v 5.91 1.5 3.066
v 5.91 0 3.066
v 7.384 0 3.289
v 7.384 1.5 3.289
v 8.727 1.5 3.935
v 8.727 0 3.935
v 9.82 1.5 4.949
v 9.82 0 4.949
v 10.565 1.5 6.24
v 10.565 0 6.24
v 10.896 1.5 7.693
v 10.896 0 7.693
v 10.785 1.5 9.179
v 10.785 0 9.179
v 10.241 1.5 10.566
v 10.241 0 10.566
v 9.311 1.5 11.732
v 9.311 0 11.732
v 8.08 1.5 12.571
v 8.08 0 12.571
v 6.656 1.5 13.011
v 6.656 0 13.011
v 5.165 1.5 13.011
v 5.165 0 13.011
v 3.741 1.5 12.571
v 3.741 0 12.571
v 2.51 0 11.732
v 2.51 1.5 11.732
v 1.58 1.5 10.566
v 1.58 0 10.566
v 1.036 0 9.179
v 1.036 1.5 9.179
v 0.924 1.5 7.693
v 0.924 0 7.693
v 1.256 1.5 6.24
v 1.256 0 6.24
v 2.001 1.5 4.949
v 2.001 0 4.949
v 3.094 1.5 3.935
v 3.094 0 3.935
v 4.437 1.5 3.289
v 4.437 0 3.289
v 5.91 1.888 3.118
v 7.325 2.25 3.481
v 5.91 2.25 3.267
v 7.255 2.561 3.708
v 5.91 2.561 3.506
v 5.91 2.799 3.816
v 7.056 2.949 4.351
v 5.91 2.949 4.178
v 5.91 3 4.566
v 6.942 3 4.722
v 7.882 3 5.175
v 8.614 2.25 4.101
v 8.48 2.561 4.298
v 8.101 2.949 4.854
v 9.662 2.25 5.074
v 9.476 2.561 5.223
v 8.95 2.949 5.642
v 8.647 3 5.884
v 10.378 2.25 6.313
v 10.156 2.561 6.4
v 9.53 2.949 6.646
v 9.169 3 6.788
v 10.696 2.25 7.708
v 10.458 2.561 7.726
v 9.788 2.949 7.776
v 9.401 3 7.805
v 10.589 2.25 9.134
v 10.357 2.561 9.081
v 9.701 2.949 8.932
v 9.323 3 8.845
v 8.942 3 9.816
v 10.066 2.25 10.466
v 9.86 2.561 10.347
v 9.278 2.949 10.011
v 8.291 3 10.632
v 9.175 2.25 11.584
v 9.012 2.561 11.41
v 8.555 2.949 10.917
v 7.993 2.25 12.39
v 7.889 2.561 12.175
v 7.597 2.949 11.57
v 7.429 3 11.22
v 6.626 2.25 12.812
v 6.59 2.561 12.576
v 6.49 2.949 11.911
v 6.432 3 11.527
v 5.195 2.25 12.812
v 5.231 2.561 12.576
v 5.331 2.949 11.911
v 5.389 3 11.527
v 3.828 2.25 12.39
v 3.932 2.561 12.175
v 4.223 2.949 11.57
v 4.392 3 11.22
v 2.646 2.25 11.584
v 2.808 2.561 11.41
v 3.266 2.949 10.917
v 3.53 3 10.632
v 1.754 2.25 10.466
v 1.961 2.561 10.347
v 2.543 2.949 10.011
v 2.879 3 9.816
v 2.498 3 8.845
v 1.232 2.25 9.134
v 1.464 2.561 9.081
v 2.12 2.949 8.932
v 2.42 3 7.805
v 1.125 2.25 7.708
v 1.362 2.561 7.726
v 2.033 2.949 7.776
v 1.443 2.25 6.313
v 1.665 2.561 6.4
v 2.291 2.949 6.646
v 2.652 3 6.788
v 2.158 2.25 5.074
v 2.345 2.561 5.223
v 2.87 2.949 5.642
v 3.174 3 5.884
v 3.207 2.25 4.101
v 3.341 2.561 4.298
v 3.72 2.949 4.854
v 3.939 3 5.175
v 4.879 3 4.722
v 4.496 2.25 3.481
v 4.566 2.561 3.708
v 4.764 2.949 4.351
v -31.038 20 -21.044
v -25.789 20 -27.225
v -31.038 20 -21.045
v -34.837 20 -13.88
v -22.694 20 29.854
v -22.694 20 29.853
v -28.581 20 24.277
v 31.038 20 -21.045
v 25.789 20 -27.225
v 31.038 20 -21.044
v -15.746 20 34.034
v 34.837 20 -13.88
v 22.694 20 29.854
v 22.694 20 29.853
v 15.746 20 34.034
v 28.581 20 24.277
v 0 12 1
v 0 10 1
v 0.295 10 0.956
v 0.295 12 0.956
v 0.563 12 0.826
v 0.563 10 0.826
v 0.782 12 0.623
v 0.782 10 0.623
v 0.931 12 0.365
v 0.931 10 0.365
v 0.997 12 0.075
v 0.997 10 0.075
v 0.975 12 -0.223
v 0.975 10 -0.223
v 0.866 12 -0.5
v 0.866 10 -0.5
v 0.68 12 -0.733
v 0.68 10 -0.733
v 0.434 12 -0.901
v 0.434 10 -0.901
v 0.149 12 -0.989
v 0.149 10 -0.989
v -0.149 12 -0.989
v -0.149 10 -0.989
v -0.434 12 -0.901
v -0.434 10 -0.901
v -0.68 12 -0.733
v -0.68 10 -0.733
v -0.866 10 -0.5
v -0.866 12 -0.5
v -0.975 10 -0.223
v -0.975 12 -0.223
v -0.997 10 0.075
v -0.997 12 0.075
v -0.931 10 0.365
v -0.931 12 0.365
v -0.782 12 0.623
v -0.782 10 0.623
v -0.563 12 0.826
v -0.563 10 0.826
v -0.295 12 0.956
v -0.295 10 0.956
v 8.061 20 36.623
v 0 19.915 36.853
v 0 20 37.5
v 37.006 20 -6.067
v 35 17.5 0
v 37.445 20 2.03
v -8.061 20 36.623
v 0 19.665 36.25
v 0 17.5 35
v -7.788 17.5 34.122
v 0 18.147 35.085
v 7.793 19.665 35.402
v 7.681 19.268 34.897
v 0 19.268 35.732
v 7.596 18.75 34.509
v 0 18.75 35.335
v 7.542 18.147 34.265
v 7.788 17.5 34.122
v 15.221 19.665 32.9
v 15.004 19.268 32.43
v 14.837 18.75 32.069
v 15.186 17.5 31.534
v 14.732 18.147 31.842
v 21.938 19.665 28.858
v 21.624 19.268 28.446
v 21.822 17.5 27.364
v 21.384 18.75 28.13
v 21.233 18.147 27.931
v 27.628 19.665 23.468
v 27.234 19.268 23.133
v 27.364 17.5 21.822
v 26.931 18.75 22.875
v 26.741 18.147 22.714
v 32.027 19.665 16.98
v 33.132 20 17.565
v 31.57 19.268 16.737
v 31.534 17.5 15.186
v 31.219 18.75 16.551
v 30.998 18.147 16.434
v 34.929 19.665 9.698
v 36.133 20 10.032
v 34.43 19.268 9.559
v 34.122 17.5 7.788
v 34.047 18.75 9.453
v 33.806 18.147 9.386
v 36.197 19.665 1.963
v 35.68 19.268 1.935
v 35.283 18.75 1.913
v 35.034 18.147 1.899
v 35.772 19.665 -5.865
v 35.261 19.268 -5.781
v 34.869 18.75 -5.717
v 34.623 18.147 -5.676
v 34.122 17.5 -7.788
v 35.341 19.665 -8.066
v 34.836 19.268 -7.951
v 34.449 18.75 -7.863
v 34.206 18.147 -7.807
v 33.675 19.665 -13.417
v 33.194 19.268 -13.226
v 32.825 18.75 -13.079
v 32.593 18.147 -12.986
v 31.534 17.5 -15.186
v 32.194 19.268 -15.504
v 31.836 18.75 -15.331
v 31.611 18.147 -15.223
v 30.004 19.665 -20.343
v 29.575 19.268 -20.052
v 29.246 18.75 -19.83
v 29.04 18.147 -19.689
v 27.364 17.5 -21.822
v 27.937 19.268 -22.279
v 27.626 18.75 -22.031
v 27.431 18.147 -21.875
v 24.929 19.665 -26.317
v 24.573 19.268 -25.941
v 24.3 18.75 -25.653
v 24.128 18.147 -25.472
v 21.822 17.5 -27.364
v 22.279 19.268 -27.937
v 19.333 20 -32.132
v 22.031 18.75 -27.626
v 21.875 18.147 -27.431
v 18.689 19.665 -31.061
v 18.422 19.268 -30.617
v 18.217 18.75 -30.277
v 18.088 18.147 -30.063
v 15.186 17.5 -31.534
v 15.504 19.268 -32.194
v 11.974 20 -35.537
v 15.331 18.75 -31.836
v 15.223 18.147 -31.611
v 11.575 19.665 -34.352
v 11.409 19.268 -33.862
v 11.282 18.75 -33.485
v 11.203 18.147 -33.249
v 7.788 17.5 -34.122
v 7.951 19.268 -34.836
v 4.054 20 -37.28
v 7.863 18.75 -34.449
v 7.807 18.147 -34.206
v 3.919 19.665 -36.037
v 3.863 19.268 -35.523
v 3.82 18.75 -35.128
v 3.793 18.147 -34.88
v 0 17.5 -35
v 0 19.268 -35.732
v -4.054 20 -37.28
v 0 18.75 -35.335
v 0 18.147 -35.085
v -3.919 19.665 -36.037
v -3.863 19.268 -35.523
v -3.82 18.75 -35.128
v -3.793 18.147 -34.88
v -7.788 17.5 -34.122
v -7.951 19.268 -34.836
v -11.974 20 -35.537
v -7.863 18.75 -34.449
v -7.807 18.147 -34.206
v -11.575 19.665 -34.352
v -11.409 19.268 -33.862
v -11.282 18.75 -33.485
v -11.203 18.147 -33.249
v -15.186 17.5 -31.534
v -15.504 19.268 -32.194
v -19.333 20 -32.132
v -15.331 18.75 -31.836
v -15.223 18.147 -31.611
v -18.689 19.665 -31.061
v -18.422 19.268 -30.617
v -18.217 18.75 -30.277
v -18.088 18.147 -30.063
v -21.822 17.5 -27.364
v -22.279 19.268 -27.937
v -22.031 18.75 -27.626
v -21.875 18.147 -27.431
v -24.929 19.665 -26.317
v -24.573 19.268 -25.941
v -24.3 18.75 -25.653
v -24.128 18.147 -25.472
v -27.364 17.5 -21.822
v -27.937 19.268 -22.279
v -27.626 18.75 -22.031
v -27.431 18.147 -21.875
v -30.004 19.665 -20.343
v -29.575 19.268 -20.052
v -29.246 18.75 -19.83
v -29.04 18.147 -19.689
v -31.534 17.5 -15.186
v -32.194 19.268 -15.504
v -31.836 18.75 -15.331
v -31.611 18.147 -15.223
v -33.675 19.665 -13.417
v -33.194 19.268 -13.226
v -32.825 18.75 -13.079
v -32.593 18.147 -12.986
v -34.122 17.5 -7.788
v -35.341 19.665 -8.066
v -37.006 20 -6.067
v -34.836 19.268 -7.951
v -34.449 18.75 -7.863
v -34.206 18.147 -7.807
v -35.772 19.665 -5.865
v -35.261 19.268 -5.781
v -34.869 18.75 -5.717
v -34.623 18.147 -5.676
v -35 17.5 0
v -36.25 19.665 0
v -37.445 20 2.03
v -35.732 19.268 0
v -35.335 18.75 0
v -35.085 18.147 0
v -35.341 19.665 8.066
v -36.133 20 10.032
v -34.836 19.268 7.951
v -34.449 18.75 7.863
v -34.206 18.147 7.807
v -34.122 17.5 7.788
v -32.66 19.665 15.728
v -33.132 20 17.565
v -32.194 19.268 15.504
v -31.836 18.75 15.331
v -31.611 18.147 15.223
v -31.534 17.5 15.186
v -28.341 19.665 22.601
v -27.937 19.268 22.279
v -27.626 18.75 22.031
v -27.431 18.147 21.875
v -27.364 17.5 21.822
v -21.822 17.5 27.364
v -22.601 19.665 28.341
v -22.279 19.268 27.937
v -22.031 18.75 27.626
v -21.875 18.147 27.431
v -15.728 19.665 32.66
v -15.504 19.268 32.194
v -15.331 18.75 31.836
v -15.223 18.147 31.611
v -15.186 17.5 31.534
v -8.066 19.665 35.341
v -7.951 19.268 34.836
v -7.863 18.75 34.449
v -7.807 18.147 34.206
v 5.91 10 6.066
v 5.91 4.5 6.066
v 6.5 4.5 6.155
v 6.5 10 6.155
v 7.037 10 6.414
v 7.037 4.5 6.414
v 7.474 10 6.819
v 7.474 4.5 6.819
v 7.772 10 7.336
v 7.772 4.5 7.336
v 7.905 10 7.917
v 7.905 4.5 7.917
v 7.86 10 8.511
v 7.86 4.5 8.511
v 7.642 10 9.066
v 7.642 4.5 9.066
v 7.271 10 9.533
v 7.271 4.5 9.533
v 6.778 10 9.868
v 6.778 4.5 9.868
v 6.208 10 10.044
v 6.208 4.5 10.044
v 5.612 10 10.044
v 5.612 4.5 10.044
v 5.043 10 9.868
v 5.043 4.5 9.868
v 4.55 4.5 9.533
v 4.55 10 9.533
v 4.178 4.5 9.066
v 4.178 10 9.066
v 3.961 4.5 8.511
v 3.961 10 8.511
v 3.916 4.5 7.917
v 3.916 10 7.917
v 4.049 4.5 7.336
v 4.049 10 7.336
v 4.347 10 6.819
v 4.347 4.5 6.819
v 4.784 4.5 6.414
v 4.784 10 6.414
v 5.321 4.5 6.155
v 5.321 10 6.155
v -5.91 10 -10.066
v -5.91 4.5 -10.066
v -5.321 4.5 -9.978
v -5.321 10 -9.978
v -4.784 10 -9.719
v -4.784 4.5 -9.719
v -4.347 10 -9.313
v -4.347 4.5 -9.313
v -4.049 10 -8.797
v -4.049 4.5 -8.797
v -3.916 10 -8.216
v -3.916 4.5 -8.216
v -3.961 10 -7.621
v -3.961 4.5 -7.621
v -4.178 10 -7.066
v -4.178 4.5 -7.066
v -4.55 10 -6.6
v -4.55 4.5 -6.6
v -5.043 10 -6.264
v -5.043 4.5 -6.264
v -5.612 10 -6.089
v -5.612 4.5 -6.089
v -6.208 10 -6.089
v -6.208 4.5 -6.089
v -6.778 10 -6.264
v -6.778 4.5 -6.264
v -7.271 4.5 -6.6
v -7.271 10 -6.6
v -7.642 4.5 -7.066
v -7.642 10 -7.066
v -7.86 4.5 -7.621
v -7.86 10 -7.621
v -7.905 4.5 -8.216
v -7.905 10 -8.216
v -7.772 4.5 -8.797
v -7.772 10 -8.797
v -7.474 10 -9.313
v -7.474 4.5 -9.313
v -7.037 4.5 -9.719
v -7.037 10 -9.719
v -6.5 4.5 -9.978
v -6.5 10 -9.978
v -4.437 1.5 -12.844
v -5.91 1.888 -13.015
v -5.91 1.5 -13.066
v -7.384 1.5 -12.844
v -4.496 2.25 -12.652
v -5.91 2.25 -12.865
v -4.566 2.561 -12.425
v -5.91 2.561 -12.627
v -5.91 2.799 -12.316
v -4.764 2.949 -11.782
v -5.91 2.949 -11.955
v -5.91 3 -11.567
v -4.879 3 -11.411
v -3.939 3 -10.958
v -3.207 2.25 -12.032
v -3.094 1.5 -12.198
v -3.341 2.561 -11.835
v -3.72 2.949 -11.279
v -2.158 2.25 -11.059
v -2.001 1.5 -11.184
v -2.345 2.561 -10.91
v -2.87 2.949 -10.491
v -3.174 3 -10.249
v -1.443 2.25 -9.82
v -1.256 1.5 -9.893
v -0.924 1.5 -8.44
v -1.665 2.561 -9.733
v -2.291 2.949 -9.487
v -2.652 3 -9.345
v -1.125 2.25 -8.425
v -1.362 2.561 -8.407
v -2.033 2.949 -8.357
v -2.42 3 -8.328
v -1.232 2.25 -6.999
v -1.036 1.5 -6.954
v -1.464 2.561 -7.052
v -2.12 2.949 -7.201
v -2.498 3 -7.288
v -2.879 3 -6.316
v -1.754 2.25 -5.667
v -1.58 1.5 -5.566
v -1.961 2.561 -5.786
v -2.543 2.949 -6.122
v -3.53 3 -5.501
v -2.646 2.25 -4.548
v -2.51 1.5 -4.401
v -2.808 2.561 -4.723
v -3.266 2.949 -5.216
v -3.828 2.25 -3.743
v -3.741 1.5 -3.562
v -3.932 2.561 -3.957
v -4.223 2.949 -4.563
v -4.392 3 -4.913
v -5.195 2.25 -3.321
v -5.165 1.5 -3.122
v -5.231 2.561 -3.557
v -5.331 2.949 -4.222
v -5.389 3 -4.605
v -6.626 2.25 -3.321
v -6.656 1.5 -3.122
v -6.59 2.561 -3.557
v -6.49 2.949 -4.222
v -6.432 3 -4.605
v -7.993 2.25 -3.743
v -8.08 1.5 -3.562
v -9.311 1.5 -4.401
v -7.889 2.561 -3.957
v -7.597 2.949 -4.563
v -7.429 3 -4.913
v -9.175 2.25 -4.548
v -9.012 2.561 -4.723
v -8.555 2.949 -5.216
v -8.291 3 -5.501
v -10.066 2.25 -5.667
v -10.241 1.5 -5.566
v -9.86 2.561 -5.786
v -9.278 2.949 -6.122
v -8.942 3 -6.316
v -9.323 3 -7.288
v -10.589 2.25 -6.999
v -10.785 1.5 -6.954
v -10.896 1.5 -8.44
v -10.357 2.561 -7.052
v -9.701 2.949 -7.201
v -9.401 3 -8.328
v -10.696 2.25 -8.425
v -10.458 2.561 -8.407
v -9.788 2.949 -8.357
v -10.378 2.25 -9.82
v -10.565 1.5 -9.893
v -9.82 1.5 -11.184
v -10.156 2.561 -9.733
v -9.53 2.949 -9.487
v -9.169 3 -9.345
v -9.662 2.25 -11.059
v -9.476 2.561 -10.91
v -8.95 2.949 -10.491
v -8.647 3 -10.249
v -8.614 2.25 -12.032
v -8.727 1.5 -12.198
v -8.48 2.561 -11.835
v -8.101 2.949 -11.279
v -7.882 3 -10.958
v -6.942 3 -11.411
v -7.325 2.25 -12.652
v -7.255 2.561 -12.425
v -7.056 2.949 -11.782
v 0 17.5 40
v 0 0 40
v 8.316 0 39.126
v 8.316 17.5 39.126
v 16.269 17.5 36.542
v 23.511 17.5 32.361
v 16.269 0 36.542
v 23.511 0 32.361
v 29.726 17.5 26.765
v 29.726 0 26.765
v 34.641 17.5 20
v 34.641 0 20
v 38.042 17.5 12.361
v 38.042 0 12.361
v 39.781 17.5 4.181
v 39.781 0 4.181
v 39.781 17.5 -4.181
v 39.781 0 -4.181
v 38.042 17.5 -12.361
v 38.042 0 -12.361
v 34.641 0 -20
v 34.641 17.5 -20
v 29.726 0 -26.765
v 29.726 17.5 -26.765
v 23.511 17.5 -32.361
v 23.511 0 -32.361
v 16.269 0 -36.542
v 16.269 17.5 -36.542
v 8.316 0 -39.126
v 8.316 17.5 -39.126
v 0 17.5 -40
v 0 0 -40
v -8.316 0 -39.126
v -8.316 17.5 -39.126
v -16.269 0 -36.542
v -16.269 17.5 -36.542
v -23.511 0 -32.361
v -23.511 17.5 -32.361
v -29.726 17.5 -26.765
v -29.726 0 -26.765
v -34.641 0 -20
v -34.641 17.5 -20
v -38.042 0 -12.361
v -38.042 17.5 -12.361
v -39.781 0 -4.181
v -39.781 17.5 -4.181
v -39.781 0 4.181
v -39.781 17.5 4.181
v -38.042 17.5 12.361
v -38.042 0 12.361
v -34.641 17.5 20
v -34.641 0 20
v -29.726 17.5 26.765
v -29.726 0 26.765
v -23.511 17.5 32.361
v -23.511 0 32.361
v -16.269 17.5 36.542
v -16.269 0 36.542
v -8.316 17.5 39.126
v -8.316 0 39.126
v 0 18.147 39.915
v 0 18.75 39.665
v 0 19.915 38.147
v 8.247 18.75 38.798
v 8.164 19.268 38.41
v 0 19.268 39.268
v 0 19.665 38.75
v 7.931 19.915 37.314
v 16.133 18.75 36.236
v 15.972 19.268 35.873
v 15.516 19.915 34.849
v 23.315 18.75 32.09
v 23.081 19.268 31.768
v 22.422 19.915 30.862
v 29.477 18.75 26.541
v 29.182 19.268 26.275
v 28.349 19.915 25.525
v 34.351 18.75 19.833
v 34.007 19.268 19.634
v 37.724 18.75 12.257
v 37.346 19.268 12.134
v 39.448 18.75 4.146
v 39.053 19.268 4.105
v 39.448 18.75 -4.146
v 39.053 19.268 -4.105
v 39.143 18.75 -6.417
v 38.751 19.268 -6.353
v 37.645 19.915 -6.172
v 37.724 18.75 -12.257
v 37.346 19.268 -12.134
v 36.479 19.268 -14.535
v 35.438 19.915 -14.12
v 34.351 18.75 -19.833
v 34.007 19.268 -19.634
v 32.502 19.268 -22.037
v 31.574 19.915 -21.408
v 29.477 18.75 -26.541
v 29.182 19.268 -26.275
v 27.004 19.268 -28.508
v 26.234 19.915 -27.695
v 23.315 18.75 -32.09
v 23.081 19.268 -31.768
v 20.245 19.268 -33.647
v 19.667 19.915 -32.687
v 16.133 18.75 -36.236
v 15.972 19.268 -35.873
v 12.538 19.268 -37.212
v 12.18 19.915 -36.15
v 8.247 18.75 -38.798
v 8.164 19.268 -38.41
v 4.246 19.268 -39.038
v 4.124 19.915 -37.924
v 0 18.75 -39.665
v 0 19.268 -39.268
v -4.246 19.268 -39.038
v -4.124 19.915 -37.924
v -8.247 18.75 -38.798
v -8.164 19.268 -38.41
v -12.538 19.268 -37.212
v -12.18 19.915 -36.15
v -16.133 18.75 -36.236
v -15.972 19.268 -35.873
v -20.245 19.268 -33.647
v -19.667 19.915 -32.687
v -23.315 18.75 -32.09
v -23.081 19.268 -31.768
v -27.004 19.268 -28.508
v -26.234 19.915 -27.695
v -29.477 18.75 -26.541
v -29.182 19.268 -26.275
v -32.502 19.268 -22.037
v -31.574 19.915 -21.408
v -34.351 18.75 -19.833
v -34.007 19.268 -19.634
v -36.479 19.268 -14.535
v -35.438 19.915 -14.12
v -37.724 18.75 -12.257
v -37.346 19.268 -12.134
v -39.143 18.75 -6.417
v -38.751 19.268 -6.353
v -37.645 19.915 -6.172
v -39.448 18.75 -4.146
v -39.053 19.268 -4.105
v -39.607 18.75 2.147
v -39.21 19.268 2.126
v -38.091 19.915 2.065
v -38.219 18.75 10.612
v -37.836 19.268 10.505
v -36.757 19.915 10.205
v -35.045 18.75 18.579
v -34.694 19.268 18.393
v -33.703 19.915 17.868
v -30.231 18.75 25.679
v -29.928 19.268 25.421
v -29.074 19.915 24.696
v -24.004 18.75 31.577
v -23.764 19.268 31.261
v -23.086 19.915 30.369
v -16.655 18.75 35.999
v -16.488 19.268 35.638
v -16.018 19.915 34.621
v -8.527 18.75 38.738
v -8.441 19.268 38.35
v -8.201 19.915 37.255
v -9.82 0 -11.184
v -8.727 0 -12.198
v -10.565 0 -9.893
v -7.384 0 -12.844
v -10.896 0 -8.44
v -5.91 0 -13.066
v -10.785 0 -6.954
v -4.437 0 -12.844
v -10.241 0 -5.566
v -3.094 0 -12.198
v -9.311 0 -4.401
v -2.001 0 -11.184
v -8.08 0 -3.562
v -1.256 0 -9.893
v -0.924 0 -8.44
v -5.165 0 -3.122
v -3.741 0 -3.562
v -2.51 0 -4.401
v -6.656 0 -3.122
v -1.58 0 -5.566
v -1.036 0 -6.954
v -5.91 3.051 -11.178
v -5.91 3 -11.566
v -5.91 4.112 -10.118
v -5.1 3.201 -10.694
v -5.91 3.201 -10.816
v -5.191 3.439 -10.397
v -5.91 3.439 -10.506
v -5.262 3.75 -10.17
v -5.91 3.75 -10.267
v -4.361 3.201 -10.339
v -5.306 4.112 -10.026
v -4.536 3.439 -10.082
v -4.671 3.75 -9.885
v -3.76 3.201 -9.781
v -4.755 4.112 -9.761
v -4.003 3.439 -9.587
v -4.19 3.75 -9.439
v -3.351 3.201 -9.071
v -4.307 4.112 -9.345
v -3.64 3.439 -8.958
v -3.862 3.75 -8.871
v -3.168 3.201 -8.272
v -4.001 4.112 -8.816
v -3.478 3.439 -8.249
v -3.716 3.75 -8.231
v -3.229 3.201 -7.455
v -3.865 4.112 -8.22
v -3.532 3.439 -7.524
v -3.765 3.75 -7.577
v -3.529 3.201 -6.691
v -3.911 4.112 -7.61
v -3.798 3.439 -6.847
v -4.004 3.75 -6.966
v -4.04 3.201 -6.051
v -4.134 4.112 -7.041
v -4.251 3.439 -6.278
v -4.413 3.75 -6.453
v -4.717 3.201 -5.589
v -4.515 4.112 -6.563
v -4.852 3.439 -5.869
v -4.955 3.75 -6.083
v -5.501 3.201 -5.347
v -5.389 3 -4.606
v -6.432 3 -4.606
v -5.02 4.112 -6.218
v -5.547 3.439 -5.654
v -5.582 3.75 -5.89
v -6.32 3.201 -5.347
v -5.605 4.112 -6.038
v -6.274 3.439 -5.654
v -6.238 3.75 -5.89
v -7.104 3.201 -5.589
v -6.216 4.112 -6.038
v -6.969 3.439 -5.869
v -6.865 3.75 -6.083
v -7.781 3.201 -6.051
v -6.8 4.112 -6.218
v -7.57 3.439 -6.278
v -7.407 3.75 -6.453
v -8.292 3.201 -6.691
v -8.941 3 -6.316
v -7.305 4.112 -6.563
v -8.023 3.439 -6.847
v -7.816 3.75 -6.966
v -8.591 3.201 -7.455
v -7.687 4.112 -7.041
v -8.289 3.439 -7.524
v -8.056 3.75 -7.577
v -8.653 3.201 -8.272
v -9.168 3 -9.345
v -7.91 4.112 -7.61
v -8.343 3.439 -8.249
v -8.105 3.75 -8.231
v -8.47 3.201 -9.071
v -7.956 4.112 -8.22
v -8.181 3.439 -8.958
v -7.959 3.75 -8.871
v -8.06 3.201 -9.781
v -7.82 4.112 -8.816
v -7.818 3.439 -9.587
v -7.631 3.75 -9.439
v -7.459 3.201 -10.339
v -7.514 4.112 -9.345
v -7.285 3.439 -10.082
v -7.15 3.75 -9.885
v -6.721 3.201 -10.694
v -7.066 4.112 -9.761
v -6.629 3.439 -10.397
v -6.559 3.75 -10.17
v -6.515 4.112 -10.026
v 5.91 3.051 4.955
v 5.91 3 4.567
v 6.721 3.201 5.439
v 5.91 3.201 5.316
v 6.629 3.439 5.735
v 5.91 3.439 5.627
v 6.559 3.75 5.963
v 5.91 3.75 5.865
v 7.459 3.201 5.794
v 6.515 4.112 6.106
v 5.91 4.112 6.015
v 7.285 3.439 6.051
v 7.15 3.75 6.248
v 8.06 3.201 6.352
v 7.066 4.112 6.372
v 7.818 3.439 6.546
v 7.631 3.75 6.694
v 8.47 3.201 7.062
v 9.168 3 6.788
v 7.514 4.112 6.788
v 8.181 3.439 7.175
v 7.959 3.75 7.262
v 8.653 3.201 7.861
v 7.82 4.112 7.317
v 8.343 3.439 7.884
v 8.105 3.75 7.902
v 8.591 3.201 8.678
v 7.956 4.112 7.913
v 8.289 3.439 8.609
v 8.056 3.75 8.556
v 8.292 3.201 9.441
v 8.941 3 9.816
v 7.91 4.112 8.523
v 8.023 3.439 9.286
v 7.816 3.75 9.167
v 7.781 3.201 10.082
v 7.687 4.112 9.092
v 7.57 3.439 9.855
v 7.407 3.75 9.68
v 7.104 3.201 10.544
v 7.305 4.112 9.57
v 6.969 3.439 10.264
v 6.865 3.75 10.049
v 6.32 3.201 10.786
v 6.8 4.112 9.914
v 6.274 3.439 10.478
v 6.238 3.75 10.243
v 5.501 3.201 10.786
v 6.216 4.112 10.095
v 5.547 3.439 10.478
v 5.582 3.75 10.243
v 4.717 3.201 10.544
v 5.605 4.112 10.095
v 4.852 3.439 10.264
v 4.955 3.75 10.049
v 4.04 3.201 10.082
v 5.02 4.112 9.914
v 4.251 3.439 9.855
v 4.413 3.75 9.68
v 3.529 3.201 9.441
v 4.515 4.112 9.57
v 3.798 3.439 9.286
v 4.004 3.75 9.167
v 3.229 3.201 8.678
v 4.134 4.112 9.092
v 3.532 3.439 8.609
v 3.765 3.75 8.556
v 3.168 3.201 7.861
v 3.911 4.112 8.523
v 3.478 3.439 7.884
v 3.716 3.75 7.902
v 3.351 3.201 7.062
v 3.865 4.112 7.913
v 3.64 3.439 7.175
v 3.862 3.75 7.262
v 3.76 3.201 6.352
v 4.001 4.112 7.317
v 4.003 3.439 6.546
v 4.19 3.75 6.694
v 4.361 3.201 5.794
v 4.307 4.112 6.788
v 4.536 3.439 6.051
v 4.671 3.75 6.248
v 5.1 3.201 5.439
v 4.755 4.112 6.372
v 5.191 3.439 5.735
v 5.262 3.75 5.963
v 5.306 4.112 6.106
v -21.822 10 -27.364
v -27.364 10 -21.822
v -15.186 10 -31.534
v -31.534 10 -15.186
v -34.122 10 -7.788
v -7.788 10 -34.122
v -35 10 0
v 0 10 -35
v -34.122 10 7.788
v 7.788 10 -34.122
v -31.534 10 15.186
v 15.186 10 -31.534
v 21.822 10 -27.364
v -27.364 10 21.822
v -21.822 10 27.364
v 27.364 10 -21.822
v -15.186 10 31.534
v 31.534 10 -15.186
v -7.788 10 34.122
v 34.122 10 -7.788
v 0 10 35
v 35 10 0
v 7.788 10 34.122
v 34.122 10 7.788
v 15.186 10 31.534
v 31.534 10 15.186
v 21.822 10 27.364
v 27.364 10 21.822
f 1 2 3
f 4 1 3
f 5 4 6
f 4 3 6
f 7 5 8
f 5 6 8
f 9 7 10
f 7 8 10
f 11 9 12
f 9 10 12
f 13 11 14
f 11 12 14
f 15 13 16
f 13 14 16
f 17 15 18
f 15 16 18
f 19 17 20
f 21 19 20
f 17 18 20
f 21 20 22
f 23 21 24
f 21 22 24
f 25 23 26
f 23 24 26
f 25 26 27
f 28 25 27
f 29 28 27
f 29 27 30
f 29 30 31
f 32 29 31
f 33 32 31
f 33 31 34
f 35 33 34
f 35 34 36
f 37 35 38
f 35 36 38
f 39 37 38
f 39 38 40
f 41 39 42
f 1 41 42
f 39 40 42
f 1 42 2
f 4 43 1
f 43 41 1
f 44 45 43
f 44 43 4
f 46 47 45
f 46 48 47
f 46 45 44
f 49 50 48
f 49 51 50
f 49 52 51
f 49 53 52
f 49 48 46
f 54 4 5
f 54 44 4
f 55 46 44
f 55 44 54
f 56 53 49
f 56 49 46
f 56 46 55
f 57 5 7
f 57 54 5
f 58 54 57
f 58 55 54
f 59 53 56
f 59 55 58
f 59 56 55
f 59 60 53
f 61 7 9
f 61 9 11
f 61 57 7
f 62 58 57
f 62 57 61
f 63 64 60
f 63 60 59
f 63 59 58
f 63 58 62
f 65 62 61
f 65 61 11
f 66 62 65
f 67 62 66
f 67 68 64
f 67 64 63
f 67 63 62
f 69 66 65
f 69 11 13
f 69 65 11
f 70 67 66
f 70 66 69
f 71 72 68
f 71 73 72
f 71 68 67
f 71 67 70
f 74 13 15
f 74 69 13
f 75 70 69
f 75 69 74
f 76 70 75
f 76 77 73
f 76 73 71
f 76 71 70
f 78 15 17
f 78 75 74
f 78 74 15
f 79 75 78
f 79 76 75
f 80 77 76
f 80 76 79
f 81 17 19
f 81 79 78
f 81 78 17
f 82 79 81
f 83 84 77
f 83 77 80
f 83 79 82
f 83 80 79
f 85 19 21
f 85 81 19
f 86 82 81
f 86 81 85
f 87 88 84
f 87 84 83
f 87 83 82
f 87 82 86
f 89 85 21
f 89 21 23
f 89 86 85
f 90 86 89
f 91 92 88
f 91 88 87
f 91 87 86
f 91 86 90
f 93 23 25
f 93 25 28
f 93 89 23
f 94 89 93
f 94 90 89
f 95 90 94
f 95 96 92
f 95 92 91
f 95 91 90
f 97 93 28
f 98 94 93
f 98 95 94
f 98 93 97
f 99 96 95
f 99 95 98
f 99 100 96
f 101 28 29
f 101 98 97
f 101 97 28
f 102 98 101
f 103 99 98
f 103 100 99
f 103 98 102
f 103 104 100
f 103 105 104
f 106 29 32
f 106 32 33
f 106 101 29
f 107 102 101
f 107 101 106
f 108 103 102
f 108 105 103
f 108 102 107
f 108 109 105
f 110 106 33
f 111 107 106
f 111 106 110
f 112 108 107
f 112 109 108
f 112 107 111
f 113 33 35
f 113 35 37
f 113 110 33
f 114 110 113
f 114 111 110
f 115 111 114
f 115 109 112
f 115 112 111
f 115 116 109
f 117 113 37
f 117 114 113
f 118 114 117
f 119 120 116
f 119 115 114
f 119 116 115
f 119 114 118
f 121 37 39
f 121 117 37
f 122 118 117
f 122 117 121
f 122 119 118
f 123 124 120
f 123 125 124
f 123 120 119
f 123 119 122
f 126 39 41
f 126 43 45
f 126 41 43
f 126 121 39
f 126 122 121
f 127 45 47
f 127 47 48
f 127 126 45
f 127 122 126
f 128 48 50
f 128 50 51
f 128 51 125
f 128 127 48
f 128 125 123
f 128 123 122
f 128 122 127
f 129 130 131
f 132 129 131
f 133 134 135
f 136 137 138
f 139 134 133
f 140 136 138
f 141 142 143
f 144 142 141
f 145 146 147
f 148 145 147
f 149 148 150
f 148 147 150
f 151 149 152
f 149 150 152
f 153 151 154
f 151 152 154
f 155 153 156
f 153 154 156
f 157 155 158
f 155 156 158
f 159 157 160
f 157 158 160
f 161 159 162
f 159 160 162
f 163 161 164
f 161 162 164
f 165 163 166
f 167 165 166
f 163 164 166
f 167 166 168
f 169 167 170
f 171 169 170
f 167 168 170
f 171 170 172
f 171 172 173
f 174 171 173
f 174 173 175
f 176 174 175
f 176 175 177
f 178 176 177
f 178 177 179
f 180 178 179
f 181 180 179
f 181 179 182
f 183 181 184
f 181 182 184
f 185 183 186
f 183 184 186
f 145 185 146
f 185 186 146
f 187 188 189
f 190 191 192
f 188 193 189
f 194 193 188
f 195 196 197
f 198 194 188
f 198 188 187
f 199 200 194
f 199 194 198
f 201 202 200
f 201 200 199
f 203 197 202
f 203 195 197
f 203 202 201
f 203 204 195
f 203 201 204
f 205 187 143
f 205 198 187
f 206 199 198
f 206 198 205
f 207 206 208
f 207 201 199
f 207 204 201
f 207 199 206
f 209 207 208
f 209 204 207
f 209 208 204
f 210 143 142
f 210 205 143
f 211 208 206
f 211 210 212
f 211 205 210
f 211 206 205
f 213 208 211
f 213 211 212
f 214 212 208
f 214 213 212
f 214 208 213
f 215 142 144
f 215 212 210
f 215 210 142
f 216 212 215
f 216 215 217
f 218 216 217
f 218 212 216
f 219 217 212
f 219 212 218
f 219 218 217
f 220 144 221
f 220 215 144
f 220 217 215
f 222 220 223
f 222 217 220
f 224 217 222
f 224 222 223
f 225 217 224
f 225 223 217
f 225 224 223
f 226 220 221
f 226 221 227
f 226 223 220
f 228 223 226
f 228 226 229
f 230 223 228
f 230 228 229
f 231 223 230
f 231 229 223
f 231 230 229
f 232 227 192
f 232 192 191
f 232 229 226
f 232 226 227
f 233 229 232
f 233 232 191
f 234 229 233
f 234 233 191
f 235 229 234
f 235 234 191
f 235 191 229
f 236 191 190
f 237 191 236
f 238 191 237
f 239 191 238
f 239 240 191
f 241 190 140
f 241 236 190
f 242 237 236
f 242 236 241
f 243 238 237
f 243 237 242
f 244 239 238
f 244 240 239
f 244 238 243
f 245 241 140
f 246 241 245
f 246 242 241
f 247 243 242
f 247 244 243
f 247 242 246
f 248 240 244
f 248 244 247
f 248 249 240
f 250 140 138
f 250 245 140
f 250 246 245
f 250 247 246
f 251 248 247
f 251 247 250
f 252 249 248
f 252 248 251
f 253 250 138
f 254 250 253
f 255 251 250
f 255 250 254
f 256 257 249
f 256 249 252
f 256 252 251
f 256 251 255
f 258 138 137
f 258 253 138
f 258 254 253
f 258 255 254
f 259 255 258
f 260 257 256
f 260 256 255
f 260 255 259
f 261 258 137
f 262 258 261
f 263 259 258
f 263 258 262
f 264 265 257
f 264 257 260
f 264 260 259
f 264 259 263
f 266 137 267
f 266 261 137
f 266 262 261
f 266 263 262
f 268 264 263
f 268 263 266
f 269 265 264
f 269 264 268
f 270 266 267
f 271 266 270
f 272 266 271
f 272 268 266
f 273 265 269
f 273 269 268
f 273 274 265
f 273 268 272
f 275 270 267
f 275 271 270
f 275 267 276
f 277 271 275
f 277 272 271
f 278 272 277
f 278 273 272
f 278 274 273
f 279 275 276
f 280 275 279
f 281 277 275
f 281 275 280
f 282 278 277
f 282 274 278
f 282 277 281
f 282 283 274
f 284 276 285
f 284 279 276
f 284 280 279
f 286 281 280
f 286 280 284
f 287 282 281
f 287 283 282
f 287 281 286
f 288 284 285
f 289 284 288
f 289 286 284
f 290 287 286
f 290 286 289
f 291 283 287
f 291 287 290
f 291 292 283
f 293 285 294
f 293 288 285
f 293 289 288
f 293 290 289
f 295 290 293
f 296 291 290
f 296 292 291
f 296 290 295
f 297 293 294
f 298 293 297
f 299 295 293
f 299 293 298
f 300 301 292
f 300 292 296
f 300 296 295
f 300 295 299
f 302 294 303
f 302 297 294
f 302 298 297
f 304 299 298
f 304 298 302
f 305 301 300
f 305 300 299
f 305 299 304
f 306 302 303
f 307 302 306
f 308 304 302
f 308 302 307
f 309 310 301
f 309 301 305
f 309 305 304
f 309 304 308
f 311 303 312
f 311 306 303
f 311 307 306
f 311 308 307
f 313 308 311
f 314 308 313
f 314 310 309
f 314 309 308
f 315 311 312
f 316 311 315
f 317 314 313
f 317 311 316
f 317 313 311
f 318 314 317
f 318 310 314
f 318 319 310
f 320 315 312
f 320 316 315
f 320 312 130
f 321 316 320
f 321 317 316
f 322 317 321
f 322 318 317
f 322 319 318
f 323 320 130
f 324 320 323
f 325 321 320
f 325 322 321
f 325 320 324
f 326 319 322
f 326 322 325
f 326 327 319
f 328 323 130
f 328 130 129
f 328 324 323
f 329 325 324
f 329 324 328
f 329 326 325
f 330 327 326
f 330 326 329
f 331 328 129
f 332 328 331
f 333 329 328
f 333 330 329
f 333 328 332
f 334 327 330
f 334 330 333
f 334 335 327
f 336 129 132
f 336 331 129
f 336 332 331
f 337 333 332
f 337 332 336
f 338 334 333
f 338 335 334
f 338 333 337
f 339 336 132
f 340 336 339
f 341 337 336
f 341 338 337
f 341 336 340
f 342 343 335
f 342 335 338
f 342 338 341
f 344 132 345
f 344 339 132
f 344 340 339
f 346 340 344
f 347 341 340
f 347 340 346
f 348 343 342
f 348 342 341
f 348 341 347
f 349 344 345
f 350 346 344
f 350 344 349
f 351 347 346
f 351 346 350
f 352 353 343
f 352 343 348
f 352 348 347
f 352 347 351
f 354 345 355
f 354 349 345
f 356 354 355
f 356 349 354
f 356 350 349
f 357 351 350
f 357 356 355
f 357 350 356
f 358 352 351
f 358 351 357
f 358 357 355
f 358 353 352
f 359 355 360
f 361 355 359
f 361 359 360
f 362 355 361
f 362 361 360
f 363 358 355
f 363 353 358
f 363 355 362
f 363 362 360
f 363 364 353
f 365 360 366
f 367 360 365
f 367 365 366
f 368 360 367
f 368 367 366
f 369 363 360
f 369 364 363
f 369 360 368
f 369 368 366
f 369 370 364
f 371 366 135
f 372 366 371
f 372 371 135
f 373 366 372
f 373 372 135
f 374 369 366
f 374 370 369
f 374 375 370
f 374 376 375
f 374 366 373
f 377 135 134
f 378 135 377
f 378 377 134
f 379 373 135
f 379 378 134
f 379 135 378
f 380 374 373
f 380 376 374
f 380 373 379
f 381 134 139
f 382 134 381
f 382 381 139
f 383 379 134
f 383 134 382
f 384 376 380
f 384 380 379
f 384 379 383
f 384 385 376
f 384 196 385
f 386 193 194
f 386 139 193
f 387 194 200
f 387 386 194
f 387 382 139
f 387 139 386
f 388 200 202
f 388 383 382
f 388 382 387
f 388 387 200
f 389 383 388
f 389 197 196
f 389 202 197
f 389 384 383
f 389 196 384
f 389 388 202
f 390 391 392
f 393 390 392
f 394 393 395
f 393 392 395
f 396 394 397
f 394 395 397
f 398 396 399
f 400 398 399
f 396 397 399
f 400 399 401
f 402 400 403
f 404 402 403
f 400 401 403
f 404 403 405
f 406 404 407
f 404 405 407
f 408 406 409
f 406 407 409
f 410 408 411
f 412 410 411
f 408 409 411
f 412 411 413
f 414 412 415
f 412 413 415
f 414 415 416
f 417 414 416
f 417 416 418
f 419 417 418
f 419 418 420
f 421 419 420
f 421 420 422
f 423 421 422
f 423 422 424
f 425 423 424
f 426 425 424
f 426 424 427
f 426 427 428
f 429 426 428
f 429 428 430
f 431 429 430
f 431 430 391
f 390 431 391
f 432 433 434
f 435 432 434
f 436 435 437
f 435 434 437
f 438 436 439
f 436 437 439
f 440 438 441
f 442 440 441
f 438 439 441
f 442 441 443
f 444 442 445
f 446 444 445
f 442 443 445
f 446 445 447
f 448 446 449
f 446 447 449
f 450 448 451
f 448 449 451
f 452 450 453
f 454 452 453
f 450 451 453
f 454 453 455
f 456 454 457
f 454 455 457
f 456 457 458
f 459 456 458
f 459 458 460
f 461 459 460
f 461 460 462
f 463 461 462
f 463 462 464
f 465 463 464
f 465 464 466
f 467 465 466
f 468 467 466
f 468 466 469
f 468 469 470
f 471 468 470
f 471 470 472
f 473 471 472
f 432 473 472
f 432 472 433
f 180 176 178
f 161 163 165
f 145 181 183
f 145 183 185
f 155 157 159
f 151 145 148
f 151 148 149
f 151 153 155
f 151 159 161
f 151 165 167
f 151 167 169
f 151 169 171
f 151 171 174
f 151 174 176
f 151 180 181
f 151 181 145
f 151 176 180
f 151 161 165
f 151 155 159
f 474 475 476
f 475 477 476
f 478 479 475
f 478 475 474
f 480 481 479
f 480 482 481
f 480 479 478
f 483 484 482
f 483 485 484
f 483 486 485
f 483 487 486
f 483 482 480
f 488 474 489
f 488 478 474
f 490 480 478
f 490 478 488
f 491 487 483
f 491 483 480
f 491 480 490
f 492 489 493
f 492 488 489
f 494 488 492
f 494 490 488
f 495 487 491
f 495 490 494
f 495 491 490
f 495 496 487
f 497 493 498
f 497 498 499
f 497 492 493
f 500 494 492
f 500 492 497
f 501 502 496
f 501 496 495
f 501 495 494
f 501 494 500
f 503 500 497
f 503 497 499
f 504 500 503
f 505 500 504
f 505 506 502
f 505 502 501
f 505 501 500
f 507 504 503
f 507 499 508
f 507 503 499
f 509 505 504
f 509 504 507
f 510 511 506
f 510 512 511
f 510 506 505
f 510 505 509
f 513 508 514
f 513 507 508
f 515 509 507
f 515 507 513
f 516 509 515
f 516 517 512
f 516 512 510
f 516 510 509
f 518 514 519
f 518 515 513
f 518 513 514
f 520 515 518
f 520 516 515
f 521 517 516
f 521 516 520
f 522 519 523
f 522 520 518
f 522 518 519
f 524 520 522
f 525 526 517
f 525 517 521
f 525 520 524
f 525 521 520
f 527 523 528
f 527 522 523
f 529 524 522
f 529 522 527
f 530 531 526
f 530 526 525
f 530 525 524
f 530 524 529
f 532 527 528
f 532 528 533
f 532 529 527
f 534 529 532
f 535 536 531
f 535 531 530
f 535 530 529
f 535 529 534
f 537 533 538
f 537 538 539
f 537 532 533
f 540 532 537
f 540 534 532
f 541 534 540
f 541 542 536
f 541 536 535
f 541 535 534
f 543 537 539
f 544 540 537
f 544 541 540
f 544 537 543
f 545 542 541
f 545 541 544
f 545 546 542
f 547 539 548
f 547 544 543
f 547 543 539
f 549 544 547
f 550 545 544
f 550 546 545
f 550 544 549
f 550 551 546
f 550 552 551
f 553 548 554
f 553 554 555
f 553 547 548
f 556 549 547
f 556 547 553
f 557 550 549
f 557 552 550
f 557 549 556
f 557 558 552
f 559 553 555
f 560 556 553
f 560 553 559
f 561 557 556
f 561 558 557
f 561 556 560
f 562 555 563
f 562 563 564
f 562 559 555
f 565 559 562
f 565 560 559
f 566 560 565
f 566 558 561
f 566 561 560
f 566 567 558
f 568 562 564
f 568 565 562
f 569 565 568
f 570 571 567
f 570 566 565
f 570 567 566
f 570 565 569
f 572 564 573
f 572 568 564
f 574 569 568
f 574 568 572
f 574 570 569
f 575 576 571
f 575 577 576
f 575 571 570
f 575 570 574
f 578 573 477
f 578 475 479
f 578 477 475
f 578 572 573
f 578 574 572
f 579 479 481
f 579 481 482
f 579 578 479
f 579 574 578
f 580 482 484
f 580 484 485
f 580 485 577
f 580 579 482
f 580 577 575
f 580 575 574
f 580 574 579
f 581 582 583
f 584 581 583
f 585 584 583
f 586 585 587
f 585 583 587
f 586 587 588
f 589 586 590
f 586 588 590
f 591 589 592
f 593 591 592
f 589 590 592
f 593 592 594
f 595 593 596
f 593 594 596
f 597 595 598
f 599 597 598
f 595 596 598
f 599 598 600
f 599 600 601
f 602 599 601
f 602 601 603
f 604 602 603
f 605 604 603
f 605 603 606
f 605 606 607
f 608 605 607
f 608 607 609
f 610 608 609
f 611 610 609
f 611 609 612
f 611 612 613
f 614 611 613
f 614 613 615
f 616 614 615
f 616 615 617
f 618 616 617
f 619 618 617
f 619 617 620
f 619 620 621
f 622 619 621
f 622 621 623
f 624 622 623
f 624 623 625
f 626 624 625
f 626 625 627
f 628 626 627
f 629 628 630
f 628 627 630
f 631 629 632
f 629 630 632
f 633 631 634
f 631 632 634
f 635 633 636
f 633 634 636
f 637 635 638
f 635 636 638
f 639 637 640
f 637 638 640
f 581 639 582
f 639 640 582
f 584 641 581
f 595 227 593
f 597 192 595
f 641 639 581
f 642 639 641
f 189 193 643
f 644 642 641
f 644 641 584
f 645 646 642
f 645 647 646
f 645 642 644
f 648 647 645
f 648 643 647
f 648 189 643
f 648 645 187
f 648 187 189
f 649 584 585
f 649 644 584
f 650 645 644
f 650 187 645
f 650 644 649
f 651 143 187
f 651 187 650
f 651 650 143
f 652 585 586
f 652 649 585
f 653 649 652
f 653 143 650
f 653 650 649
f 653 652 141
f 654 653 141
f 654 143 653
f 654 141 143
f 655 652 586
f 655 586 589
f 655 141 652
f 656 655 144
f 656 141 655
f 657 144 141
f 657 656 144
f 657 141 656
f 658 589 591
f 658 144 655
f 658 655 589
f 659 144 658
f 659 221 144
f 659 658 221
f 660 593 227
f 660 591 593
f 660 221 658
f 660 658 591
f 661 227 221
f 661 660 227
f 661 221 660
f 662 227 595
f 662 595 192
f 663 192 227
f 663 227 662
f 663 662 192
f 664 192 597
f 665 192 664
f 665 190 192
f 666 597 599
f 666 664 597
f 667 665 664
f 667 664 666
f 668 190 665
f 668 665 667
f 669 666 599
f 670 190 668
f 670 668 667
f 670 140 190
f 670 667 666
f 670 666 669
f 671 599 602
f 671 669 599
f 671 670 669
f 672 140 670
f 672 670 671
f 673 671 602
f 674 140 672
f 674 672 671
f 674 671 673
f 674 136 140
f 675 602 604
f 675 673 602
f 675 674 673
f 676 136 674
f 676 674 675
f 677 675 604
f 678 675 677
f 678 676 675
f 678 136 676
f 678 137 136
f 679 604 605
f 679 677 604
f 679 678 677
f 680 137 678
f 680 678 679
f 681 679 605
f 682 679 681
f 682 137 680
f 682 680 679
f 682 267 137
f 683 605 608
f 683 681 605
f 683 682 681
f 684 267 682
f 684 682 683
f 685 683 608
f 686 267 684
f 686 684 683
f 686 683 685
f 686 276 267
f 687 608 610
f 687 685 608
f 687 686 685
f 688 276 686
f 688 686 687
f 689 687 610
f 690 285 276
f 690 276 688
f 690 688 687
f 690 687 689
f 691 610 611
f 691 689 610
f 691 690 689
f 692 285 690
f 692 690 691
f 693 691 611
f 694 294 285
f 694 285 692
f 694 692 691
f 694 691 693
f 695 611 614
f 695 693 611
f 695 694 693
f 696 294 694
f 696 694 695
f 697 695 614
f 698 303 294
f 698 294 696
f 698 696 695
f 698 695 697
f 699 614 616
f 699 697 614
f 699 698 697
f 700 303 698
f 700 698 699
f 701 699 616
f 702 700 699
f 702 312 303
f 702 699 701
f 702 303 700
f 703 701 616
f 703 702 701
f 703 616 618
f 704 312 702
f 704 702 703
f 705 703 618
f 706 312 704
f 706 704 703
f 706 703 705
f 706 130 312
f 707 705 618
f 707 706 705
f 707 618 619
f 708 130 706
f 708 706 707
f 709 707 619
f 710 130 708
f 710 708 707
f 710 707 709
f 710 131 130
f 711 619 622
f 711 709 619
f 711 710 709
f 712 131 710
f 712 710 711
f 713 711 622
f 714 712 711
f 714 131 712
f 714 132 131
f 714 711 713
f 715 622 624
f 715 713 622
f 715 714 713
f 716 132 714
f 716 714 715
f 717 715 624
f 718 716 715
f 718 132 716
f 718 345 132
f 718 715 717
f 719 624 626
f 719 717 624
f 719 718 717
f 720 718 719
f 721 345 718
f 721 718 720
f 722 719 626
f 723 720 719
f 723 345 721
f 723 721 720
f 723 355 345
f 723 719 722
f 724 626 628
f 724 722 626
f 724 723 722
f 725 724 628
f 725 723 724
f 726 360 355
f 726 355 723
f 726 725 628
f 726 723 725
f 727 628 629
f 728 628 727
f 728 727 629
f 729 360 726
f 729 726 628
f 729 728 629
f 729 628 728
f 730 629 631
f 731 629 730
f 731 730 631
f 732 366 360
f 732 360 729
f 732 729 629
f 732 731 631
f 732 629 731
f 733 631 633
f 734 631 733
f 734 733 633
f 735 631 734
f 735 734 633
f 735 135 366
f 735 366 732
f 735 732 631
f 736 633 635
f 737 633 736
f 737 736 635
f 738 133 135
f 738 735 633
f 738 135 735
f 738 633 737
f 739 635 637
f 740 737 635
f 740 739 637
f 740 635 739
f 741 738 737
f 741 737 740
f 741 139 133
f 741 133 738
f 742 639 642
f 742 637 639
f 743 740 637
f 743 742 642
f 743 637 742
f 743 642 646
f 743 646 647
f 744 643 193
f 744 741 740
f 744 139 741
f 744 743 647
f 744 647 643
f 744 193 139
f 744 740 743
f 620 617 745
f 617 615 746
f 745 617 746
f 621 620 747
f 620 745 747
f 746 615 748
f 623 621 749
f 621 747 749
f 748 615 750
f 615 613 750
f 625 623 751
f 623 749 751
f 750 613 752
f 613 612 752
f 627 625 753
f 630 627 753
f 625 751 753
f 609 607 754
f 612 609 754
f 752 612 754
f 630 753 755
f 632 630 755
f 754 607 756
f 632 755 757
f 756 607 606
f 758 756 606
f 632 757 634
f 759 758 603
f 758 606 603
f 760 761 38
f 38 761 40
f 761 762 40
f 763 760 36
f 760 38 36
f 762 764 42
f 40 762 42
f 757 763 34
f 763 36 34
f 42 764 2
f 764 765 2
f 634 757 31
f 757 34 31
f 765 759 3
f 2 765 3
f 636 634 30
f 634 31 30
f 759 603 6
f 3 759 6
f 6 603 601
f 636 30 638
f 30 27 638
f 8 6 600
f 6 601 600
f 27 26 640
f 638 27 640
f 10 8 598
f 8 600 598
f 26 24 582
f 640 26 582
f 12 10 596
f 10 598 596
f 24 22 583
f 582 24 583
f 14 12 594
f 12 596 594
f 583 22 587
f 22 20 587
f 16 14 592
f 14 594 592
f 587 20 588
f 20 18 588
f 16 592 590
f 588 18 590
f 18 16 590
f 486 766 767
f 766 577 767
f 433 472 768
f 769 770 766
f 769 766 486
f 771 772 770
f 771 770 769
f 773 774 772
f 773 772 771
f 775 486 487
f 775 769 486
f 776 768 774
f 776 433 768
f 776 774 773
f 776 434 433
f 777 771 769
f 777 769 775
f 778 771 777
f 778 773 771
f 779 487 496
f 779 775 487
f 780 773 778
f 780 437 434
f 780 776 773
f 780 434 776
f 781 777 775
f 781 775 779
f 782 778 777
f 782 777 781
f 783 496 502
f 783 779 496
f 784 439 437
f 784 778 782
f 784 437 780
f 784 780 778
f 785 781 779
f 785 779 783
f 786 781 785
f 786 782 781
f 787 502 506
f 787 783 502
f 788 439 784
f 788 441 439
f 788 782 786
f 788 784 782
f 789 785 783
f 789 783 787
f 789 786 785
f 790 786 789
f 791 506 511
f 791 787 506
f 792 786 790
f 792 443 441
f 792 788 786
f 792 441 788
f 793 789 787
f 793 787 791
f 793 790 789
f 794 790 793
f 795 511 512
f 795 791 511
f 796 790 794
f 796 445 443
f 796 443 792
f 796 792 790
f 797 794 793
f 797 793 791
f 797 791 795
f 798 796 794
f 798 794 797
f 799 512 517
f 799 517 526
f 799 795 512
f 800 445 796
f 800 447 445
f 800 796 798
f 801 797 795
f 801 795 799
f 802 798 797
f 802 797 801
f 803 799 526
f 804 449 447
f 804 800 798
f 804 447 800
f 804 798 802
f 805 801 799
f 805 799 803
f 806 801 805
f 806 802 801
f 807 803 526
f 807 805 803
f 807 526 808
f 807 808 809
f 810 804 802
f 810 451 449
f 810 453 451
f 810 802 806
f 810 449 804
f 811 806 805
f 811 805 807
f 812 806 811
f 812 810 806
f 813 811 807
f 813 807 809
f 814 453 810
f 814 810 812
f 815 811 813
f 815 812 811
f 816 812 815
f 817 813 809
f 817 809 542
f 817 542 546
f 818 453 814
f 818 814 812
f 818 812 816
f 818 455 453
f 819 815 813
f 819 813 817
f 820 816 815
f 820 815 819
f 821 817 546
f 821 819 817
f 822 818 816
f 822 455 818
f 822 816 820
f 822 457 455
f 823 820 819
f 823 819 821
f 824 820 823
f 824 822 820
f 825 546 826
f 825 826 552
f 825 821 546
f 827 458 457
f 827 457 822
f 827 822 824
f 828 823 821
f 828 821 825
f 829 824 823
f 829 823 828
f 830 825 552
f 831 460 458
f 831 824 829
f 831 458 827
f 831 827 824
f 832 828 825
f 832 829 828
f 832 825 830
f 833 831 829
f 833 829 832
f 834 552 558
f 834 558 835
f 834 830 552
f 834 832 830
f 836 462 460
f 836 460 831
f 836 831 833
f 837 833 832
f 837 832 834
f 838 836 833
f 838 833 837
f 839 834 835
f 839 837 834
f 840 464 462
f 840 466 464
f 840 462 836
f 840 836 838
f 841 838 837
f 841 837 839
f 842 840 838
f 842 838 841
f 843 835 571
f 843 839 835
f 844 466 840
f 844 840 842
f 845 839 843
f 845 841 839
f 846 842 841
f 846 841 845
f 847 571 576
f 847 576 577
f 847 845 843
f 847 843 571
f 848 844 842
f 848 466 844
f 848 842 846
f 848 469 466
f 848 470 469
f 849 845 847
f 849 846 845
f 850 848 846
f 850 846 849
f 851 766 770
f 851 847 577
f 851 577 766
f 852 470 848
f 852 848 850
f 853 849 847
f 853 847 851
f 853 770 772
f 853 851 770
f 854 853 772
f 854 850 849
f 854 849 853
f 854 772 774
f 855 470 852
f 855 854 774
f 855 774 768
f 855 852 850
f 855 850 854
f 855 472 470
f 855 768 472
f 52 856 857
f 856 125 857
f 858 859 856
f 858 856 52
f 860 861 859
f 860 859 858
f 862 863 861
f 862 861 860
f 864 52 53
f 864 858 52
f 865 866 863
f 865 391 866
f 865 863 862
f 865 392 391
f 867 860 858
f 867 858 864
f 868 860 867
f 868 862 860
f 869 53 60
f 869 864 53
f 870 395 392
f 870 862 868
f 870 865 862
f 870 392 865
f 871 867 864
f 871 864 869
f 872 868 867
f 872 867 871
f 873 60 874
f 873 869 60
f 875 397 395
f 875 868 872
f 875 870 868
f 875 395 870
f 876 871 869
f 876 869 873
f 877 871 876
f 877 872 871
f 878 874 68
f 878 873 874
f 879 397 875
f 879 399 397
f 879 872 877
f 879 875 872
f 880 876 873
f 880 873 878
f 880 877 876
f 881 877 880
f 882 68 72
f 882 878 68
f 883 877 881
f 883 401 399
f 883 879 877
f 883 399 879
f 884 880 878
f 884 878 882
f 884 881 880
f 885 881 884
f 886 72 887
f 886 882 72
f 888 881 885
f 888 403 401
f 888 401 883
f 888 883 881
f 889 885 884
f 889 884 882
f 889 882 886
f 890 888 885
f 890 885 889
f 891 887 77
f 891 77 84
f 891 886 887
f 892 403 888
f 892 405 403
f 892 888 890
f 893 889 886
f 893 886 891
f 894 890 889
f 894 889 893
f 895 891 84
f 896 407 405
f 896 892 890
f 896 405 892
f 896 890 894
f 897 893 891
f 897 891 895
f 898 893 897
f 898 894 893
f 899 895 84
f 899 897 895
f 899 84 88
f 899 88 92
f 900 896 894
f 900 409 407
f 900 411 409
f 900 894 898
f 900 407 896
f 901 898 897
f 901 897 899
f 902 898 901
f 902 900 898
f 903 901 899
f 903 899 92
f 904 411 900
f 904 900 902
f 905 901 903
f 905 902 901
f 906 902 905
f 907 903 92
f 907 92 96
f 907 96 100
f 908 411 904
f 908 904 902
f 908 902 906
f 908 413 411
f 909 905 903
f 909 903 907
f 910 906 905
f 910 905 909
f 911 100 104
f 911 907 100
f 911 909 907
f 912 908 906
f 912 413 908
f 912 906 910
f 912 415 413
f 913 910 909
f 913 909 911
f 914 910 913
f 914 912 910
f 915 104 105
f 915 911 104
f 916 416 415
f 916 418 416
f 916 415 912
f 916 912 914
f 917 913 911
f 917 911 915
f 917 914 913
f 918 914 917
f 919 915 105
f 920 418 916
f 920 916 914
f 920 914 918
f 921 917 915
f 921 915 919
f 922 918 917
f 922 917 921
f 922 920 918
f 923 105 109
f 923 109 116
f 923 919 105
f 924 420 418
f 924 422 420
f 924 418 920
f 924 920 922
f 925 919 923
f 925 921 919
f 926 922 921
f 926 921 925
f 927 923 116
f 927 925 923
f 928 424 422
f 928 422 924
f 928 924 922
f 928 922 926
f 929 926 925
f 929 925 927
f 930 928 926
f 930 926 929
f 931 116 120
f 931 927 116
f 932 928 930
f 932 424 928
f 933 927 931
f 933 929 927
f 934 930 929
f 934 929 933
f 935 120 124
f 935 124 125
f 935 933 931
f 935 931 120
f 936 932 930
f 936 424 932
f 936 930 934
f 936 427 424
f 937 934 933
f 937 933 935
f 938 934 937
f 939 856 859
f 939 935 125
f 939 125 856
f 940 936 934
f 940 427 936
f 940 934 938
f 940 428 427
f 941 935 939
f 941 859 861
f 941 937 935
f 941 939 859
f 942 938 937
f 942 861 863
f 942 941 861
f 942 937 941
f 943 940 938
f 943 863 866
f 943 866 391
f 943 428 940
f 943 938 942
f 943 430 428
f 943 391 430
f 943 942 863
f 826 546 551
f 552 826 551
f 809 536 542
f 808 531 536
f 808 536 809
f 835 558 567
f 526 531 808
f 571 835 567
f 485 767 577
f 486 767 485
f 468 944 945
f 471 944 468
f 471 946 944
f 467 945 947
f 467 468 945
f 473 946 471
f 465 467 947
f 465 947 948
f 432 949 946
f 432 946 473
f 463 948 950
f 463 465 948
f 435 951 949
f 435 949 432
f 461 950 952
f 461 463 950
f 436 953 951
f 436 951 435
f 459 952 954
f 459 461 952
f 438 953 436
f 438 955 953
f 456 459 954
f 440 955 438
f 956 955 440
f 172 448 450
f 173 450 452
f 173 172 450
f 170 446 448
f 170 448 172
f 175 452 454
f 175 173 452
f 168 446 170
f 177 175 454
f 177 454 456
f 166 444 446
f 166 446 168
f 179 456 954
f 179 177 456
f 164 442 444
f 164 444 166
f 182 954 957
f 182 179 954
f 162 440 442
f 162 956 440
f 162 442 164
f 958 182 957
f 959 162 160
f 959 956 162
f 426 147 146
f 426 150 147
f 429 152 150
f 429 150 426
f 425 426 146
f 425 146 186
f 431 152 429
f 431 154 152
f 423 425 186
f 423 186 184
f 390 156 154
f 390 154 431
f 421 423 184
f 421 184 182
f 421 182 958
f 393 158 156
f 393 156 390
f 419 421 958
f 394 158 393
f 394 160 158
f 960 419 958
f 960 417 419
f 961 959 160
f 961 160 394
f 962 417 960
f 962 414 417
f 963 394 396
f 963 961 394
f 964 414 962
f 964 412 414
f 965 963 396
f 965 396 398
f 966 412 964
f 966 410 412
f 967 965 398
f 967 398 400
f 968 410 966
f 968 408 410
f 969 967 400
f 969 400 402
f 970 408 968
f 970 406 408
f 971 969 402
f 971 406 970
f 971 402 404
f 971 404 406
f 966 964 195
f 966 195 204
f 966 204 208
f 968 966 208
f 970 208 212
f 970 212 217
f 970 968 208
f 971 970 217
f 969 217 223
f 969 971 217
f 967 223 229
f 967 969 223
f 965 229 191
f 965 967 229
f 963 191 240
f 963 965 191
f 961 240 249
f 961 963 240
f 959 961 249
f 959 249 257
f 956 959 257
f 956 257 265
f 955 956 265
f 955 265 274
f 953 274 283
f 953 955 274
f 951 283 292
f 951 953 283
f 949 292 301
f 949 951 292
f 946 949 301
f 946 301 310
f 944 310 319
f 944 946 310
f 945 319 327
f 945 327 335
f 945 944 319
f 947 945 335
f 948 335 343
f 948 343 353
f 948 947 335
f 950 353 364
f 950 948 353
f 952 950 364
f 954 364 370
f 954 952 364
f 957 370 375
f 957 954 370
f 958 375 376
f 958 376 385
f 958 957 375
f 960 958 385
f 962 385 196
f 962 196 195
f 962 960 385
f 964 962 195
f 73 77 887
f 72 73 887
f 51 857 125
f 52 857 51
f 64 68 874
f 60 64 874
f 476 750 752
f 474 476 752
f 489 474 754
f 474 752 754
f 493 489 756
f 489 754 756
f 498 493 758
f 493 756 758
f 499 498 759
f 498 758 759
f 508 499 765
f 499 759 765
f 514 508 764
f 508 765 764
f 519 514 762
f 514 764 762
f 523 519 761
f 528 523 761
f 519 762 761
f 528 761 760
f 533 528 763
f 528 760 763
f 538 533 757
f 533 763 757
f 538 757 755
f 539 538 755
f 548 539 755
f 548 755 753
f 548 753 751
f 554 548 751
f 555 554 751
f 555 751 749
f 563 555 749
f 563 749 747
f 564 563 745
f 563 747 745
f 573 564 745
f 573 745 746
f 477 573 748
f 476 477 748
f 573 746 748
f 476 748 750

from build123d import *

# Parameters (mm, degrees)
SKETCH_1_R          = 40
EXTRUDE_1_DEPTH     = 10
SKETCH_2_R          = 40
SKETCH_2_R_2        = 35
EXTRUDE_2_DEPTH     = 10
SKETCH_3_R          = 2
CUT_EXTRUDE_1_DEPTH = 20
SKETCH_4_R          = 5
CUT_EXTRUDE_2_DEPTH = 3
FILLET_1_R          = 1.5
FILLET_2_R          = 1.5
FILLET_3_R          = 2.5
SKETCH_5_R          = 1
EXTRUDE_3_DEPTH     = 2


with BuildPart() as part:
    # 草圖1 → 填料-伸長1 (new body)
    with BuildSketch(Plane(origin=(0, 0, 0), x_dir=(1, 0, 0), z_dir=(0, 1, 0))):
        with Locations(Location((0, 0, 0), (0, 0, 270))):
            Circle(SKETCH_1_R)
    extrude(amount=EXTRUDE_1_DEPTH)

    # 草圖2 → 填料-伸長2 (add)
    with BuildSketch(Plane(origin=(0, 10, 0), x_dir=(1, 0, 0), z_dir=(0, 1, 0))):
        with Locations(Location((0, 0, 0), (0, 0, 270))):
            Circle(SKETCH_2_R)
        with Locations(Location((0, 0, 0), (0, 0, 270))):
            Circle(SKETCH_2_R_2, mode=Mode.SUBTRACT)
    extrude(amount=EXTRUDE_2_DEPTH)

    # 草圖3 → 除料-伸長1 (cut)
    with BuildSketch(Plane.XZ):
        with Locations(Location((5.910388913, 8.066430617, 0), (0, 0, 270))):
            Circle(SKETCH_3_R)
        with Locations(Location((-5.910388913, -8.066430617, 0), (0, 0, 270))):
            Circle(SKETCH_3_R)
    extrude(amount=-CUT_EXTRUDE_1_DEPTH, mode=Mode.SUBTRACT)

    # 草圖4 → 除料-伸長2 (cut)
    with BuildSketch(Plane.XZ):
        with Locations(Location((5.910388913, 8.066430617, 0), (0, 0, 270))):
            Circle(SKETCH_4_R)
        with Locations(Location((-5.910388913, -8.066430617, 0), (0, 0, 270))):
            Circle(SKETCH_4_R)
    extrude(amount=-CUT_EXTRUDE_2_DEPTH, mode=Mode.SUBTRACT)

    # 圓角1
    fillet_1_edges = [part.edges().sort_by_distance(p)[0] for p in [
        (-5.910388913, 3, -3.066430617),
        (-5.910388913, 3, -6.066430617),
    ]]
    fillet(fillet_1_edges, radius=FILLET_1_R - 0.0001)  # a hair under: the kernel refuses the full size

    # 圓角2
    fillet_2_edges = [part.edges().sort_by_distance(p)[0] for p in [
        (5.910388913, 3, 13.066430617),
        (5.910388913, 3, 10.066430617),
    ]]
    fillet(fillet_2_edges, radius=FILLET_2_R - 0.0001)  # a hair under: the kernel refuses the full size

    # 圓角3
    fillet_3_edges = [part.edges().sort_by_distance(p)[0] for p in [
        (0, 20, -40),
        (0, 20, -35),
    ]]
    fillet(fillet_3_edges, radius=FILLET_3_R - 0.0001)  # a hair under: the kernel refuses the full size

    # 草圖5 → 填料-伸長3 (add)
    with BuildSketch(Plane(origin=(0, 10, 0), x_dir=(1, 0, 0), z_dir=(0, 1, 0))):
        with Locations(Location((0, 0, 0), (0, 0, 270))):
            Circle(SKETCH_5_R)
    extrude(amount=EXTRUDE_3_DEPTH)


solid = part.part
